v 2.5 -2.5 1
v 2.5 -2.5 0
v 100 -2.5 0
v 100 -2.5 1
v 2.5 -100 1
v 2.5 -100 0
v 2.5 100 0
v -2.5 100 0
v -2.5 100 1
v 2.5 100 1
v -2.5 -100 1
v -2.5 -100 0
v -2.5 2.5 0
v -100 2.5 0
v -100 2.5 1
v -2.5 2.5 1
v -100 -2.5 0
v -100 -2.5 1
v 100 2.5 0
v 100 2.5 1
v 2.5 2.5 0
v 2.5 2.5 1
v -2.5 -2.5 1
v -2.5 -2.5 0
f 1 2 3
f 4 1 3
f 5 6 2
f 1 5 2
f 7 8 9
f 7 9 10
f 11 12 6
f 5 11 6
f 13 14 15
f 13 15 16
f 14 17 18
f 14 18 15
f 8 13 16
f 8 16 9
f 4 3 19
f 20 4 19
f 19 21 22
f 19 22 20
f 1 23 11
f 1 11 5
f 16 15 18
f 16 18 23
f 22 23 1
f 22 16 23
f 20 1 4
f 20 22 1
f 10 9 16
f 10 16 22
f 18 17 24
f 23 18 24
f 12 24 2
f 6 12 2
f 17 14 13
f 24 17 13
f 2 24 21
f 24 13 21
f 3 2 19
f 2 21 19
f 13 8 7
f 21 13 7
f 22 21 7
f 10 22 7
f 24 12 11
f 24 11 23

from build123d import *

# Parameters (mm, degrees)
F0_W     = 97.5
F0_H     = 5
F0_W_2   = 5
F0_H_2   = 97.5
F1_DEPTH = 1


with BuildPart() as f1:
    # F0 (on Top) → F1 (new body)
    with BuildSketch(Plane.XY):
        with Locations((-51.25, 0)):
            Rectangle(F0_W, F0_H)
        with Locations((0, 51.25)):
            Rectangle(F0_W_2, F0_H_2)
        Rectangle(F0_W_2, F0_H)
        with Locations((51.25, 0)):
            Rectangle(F0_W, F0_H)
        with Locations((0, -51.25)):
            Rectangle(F0_W_2, F0_H_2)
    extrude(amount=F1_DEPTH)


solid = f1.part
